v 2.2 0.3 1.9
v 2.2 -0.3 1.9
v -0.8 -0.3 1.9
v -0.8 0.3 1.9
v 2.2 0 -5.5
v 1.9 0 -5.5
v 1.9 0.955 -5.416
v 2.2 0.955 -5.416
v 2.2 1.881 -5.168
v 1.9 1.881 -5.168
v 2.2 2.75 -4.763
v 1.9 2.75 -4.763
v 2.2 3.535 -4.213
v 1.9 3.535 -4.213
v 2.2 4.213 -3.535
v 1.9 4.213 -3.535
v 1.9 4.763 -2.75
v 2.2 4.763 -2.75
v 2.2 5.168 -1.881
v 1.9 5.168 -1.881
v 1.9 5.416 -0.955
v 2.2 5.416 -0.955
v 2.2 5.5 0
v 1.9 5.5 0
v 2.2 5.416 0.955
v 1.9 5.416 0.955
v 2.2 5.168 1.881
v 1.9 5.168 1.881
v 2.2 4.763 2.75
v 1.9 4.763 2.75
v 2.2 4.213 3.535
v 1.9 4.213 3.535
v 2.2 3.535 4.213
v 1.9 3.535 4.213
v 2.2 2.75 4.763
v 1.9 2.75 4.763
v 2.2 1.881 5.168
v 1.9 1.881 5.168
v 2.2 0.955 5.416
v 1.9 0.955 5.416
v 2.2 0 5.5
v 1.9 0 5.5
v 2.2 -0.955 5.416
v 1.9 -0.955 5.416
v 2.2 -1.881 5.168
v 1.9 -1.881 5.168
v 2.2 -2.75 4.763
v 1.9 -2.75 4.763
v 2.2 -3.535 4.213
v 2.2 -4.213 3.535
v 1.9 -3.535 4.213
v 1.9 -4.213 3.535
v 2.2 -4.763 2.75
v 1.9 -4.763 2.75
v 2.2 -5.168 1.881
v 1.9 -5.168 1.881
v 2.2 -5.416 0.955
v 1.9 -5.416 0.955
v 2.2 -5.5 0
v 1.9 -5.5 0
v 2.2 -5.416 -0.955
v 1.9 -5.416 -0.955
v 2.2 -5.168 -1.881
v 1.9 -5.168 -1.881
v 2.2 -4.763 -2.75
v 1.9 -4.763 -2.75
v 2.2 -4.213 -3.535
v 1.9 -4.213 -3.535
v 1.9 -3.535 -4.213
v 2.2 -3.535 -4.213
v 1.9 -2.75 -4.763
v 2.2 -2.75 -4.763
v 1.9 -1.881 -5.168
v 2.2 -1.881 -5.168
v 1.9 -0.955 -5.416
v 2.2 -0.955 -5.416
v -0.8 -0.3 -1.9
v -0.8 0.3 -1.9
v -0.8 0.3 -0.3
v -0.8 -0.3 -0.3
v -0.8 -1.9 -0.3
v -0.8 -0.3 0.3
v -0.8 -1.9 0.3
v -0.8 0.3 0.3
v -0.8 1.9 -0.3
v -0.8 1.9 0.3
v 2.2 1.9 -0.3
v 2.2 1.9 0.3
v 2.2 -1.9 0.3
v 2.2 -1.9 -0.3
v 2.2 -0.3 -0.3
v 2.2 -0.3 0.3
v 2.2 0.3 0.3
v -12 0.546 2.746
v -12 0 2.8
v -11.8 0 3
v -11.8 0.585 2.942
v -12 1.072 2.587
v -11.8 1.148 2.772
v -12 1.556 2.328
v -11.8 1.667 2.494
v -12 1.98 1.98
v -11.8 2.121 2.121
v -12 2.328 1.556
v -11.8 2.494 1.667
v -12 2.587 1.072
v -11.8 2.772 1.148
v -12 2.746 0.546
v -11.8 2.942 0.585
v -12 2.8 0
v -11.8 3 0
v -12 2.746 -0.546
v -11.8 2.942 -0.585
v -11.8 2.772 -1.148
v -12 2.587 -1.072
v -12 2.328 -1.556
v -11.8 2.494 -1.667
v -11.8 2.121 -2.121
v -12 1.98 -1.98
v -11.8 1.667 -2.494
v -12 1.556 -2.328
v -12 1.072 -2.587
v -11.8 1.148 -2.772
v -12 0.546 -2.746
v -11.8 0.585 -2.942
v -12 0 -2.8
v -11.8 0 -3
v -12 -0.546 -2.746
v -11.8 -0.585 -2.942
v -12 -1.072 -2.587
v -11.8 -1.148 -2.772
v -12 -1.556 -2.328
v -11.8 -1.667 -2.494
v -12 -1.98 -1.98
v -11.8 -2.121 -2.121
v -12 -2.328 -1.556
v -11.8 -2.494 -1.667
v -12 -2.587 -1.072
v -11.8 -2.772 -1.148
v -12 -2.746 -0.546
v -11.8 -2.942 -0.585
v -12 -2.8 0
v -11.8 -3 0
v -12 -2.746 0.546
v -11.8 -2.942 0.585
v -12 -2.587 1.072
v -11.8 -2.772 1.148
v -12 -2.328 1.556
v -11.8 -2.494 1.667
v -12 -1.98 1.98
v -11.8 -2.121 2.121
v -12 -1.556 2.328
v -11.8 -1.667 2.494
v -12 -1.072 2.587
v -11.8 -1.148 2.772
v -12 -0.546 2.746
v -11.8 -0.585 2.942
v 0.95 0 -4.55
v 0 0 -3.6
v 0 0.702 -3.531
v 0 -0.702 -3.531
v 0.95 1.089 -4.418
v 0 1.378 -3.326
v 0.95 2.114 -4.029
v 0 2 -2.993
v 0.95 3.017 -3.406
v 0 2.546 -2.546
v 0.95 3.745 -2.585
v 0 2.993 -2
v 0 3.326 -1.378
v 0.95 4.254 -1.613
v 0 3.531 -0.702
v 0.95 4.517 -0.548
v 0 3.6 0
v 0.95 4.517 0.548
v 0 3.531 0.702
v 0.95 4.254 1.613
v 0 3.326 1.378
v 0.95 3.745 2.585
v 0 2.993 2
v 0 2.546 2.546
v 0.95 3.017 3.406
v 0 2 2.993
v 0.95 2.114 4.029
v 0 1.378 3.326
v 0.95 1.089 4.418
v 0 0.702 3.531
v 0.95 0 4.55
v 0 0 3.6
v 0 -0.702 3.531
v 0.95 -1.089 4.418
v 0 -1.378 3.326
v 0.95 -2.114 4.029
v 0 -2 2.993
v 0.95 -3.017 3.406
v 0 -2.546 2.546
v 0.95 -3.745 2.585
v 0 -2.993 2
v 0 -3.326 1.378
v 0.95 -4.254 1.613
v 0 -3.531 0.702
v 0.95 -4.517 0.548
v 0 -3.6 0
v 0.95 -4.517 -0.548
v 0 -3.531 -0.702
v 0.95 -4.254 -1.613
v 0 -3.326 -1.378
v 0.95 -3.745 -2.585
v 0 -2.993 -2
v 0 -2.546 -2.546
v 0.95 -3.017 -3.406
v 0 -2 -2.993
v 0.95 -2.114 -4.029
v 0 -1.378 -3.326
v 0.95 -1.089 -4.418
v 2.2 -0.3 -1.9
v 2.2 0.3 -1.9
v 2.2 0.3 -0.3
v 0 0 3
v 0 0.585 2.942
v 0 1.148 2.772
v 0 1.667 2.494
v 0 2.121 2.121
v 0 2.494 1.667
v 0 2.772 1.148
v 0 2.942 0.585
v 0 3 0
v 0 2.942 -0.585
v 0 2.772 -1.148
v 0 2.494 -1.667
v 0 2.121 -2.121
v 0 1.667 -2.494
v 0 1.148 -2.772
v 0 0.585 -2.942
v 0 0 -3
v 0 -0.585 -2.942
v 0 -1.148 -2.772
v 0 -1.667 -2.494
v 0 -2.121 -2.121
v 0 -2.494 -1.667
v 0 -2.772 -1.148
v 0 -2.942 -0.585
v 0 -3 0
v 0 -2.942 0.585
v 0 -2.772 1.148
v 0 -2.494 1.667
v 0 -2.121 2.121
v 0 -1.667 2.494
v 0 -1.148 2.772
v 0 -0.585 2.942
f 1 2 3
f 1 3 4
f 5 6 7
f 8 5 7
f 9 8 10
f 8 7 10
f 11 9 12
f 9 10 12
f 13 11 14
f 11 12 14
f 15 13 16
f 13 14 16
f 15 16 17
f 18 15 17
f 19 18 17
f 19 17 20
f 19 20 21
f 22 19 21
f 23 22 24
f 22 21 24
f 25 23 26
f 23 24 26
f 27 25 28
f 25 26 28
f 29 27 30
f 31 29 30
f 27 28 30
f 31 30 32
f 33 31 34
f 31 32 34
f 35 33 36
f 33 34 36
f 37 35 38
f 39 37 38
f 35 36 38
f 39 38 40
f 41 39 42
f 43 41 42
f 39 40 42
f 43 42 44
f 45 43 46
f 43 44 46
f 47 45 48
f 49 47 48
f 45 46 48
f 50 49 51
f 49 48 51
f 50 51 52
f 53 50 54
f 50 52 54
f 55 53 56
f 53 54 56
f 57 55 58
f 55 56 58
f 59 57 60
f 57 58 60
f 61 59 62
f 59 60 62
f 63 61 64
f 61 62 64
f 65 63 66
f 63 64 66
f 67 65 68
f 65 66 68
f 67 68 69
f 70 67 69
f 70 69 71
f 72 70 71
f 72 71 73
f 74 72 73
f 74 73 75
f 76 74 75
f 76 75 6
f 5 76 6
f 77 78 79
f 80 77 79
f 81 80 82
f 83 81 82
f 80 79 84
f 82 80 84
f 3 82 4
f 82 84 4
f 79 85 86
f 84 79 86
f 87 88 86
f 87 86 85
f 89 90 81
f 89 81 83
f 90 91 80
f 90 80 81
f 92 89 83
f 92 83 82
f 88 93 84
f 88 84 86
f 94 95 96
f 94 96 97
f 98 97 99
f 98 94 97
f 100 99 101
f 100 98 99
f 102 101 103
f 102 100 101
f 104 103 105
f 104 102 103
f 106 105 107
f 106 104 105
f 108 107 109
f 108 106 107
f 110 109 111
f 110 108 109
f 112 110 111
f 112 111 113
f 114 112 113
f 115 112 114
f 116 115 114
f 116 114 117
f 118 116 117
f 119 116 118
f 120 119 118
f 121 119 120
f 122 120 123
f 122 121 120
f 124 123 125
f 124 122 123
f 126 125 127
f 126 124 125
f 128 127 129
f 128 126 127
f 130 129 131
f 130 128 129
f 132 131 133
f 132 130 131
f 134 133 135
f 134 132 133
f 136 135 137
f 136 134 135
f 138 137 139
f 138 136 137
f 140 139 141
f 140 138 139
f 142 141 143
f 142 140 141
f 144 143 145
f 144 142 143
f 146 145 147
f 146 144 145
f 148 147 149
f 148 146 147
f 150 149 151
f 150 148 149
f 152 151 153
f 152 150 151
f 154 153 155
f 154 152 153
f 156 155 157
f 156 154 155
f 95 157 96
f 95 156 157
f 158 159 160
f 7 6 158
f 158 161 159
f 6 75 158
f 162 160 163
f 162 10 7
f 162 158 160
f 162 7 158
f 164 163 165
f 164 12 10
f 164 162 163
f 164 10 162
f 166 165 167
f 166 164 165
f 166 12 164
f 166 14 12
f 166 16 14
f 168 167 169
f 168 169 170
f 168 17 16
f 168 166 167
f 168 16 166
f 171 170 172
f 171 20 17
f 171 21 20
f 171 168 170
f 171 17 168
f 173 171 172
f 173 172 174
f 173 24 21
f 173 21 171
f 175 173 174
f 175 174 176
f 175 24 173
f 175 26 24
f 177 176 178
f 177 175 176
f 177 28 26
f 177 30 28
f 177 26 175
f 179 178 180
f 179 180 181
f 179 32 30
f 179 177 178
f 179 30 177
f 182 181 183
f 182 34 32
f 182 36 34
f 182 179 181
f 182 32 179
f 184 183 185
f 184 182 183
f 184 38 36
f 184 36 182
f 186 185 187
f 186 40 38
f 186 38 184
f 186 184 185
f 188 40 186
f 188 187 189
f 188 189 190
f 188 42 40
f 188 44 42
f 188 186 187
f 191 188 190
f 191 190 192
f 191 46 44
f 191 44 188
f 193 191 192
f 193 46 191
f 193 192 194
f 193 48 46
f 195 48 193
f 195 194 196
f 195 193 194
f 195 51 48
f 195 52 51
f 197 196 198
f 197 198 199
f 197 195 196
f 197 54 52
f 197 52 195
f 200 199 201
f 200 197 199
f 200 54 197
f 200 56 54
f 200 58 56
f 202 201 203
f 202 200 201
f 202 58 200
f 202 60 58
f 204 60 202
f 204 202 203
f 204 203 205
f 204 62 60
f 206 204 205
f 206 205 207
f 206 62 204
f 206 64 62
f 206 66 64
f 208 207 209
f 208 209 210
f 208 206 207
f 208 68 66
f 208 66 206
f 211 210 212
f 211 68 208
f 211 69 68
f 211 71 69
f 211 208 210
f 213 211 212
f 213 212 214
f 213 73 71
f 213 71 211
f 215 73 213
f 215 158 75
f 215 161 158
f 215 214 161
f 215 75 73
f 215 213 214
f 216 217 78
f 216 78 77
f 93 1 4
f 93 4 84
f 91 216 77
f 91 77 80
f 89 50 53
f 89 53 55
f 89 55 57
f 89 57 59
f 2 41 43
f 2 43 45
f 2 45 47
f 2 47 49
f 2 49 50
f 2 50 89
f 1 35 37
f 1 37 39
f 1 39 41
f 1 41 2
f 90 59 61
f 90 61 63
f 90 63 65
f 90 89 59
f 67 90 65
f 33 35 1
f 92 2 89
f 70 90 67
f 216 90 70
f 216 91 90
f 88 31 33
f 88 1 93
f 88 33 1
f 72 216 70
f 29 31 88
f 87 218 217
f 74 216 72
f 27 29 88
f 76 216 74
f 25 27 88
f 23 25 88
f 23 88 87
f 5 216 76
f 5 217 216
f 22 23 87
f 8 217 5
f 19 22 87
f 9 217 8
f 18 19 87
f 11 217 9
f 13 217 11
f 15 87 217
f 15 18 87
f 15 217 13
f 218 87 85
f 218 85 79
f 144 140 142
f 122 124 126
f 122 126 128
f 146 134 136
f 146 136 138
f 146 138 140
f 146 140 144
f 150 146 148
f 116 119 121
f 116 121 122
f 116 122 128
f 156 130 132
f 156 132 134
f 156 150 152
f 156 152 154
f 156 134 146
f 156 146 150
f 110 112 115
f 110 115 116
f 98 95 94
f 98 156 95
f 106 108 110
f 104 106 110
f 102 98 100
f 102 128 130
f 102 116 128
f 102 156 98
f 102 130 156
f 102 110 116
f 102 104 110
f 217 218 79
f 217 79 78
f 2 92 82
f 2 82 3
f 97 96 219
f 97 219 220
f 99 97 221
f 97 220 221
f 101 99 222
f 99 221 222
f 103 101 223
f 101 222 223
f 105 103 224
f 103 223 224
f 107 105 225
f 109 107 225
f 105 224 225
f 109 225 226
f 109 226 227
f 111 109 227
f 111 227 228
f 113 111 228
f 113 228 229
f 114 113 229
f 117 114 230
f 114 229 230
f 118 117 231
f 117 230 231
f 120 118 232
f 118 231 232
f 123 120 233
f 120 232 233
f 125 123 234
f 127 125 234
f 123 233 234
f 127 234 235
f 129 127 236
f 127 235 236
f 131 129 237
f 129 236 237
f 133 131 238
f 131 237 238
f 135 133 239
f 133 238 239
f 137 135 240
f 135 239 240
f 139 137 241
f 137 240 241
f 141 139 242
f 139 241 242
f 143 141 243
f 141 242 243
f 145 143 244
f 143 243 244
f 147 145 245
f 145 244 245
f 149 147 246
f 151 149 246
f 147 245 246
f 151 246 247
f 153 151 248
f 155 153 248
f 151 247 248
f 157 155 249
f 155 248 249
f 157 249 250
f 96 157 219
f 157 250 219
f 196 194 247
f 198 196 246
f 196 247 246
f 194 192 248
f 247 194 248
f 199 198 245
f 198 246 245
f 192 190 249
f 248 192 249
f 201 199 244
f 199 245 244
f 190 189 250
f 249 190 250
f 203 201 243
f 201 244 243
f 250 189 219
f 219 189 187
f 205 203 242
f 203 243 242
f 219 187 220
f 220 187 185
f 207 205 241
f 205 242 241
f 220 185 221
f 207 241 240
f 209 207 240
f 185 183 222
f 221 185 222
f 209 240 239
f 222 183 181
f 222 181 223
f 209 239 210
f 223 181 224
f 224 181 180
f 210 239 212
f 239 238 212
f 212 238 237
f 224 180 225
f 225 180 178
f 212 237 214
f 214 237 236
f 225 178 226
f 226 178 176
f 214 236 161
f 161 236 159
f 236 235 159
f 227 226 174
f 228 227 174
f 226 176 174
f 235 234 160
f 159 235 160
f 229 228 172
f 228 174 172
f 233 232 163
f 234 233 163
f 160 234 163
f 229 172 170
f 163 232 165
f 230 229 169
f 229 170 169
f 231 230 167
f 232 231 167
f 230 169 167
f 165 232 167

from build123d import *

# Parameters (mm, degrees)
SKETCH_1_R          = 5.5
EXTRUDE_1_DEPTH     = 2.2
SKETCH_2_R          = 3
EXTRUDE_3_DEPTH     = 12
CHAMFER_2_SIZE      = 0.2
CHAMFER_3_SIZE      = 1.9
CUT_EXTRUDE_2_DEPTH = 3


with BuildPart() as part:
    # 草图1 → 凸台-拉伸1 (new body)
    with BuildSketch(Plane(origin=(0, 0, 0), x_dir=(0, 0, -1), z_dir=(1, 0, 0))):
        Circle(SKETCH_1_R)
    extrude(amount=EXTRUDE_1_DEPTH)

    # 草图2 → 凸台-拉伸3 (add)
    with BuildSketch(Plane.ZY):
        Circle(SKETCH_2_R)
    extrude(amount=EXTRUDE_3_DEPTH)

    # 倒角2
    chamfer_2_edges = [part.edges().sort_by_distance(p)[0] for p in [
        (-12, 0, -3),
    ]]
    chamfer(chamfer_2_edges, length=CHAMFER_2_SIZE)

    # 倒角3
    chamfer_3_edges = [part.edges().sort_by_distance(p)[0] for p in [
        (0, 0, 5.5),
    ]]
    chamfer(chamfer_3_edges, length=CHAMFER_3_SIZE)

    # 草图5 → 切除-拉伸2 (cut)
    with BuildSketch(Plane(origin=(2.2, 0, 0), x_dir=(0, 0, -1), z_dir=(1, 0, 0))):
        Polygon((0.3, 0.3), (1.9, 0.3), (1.9, -0.3), (0.3, -0.3), (0.3, -1.9), (-0.3, -1.9), (-0.3, -0.3), (-1.9, -0.3), (-1.9, 0.3), (-0.3, 0.3), (-0.3, 1.9), (0.3, 1.9), align=None)
    extrude(amount=-CUT_EXTRUDE_2_DEPTH, mode=Mode.SUBTRACT)


solid = part.part
